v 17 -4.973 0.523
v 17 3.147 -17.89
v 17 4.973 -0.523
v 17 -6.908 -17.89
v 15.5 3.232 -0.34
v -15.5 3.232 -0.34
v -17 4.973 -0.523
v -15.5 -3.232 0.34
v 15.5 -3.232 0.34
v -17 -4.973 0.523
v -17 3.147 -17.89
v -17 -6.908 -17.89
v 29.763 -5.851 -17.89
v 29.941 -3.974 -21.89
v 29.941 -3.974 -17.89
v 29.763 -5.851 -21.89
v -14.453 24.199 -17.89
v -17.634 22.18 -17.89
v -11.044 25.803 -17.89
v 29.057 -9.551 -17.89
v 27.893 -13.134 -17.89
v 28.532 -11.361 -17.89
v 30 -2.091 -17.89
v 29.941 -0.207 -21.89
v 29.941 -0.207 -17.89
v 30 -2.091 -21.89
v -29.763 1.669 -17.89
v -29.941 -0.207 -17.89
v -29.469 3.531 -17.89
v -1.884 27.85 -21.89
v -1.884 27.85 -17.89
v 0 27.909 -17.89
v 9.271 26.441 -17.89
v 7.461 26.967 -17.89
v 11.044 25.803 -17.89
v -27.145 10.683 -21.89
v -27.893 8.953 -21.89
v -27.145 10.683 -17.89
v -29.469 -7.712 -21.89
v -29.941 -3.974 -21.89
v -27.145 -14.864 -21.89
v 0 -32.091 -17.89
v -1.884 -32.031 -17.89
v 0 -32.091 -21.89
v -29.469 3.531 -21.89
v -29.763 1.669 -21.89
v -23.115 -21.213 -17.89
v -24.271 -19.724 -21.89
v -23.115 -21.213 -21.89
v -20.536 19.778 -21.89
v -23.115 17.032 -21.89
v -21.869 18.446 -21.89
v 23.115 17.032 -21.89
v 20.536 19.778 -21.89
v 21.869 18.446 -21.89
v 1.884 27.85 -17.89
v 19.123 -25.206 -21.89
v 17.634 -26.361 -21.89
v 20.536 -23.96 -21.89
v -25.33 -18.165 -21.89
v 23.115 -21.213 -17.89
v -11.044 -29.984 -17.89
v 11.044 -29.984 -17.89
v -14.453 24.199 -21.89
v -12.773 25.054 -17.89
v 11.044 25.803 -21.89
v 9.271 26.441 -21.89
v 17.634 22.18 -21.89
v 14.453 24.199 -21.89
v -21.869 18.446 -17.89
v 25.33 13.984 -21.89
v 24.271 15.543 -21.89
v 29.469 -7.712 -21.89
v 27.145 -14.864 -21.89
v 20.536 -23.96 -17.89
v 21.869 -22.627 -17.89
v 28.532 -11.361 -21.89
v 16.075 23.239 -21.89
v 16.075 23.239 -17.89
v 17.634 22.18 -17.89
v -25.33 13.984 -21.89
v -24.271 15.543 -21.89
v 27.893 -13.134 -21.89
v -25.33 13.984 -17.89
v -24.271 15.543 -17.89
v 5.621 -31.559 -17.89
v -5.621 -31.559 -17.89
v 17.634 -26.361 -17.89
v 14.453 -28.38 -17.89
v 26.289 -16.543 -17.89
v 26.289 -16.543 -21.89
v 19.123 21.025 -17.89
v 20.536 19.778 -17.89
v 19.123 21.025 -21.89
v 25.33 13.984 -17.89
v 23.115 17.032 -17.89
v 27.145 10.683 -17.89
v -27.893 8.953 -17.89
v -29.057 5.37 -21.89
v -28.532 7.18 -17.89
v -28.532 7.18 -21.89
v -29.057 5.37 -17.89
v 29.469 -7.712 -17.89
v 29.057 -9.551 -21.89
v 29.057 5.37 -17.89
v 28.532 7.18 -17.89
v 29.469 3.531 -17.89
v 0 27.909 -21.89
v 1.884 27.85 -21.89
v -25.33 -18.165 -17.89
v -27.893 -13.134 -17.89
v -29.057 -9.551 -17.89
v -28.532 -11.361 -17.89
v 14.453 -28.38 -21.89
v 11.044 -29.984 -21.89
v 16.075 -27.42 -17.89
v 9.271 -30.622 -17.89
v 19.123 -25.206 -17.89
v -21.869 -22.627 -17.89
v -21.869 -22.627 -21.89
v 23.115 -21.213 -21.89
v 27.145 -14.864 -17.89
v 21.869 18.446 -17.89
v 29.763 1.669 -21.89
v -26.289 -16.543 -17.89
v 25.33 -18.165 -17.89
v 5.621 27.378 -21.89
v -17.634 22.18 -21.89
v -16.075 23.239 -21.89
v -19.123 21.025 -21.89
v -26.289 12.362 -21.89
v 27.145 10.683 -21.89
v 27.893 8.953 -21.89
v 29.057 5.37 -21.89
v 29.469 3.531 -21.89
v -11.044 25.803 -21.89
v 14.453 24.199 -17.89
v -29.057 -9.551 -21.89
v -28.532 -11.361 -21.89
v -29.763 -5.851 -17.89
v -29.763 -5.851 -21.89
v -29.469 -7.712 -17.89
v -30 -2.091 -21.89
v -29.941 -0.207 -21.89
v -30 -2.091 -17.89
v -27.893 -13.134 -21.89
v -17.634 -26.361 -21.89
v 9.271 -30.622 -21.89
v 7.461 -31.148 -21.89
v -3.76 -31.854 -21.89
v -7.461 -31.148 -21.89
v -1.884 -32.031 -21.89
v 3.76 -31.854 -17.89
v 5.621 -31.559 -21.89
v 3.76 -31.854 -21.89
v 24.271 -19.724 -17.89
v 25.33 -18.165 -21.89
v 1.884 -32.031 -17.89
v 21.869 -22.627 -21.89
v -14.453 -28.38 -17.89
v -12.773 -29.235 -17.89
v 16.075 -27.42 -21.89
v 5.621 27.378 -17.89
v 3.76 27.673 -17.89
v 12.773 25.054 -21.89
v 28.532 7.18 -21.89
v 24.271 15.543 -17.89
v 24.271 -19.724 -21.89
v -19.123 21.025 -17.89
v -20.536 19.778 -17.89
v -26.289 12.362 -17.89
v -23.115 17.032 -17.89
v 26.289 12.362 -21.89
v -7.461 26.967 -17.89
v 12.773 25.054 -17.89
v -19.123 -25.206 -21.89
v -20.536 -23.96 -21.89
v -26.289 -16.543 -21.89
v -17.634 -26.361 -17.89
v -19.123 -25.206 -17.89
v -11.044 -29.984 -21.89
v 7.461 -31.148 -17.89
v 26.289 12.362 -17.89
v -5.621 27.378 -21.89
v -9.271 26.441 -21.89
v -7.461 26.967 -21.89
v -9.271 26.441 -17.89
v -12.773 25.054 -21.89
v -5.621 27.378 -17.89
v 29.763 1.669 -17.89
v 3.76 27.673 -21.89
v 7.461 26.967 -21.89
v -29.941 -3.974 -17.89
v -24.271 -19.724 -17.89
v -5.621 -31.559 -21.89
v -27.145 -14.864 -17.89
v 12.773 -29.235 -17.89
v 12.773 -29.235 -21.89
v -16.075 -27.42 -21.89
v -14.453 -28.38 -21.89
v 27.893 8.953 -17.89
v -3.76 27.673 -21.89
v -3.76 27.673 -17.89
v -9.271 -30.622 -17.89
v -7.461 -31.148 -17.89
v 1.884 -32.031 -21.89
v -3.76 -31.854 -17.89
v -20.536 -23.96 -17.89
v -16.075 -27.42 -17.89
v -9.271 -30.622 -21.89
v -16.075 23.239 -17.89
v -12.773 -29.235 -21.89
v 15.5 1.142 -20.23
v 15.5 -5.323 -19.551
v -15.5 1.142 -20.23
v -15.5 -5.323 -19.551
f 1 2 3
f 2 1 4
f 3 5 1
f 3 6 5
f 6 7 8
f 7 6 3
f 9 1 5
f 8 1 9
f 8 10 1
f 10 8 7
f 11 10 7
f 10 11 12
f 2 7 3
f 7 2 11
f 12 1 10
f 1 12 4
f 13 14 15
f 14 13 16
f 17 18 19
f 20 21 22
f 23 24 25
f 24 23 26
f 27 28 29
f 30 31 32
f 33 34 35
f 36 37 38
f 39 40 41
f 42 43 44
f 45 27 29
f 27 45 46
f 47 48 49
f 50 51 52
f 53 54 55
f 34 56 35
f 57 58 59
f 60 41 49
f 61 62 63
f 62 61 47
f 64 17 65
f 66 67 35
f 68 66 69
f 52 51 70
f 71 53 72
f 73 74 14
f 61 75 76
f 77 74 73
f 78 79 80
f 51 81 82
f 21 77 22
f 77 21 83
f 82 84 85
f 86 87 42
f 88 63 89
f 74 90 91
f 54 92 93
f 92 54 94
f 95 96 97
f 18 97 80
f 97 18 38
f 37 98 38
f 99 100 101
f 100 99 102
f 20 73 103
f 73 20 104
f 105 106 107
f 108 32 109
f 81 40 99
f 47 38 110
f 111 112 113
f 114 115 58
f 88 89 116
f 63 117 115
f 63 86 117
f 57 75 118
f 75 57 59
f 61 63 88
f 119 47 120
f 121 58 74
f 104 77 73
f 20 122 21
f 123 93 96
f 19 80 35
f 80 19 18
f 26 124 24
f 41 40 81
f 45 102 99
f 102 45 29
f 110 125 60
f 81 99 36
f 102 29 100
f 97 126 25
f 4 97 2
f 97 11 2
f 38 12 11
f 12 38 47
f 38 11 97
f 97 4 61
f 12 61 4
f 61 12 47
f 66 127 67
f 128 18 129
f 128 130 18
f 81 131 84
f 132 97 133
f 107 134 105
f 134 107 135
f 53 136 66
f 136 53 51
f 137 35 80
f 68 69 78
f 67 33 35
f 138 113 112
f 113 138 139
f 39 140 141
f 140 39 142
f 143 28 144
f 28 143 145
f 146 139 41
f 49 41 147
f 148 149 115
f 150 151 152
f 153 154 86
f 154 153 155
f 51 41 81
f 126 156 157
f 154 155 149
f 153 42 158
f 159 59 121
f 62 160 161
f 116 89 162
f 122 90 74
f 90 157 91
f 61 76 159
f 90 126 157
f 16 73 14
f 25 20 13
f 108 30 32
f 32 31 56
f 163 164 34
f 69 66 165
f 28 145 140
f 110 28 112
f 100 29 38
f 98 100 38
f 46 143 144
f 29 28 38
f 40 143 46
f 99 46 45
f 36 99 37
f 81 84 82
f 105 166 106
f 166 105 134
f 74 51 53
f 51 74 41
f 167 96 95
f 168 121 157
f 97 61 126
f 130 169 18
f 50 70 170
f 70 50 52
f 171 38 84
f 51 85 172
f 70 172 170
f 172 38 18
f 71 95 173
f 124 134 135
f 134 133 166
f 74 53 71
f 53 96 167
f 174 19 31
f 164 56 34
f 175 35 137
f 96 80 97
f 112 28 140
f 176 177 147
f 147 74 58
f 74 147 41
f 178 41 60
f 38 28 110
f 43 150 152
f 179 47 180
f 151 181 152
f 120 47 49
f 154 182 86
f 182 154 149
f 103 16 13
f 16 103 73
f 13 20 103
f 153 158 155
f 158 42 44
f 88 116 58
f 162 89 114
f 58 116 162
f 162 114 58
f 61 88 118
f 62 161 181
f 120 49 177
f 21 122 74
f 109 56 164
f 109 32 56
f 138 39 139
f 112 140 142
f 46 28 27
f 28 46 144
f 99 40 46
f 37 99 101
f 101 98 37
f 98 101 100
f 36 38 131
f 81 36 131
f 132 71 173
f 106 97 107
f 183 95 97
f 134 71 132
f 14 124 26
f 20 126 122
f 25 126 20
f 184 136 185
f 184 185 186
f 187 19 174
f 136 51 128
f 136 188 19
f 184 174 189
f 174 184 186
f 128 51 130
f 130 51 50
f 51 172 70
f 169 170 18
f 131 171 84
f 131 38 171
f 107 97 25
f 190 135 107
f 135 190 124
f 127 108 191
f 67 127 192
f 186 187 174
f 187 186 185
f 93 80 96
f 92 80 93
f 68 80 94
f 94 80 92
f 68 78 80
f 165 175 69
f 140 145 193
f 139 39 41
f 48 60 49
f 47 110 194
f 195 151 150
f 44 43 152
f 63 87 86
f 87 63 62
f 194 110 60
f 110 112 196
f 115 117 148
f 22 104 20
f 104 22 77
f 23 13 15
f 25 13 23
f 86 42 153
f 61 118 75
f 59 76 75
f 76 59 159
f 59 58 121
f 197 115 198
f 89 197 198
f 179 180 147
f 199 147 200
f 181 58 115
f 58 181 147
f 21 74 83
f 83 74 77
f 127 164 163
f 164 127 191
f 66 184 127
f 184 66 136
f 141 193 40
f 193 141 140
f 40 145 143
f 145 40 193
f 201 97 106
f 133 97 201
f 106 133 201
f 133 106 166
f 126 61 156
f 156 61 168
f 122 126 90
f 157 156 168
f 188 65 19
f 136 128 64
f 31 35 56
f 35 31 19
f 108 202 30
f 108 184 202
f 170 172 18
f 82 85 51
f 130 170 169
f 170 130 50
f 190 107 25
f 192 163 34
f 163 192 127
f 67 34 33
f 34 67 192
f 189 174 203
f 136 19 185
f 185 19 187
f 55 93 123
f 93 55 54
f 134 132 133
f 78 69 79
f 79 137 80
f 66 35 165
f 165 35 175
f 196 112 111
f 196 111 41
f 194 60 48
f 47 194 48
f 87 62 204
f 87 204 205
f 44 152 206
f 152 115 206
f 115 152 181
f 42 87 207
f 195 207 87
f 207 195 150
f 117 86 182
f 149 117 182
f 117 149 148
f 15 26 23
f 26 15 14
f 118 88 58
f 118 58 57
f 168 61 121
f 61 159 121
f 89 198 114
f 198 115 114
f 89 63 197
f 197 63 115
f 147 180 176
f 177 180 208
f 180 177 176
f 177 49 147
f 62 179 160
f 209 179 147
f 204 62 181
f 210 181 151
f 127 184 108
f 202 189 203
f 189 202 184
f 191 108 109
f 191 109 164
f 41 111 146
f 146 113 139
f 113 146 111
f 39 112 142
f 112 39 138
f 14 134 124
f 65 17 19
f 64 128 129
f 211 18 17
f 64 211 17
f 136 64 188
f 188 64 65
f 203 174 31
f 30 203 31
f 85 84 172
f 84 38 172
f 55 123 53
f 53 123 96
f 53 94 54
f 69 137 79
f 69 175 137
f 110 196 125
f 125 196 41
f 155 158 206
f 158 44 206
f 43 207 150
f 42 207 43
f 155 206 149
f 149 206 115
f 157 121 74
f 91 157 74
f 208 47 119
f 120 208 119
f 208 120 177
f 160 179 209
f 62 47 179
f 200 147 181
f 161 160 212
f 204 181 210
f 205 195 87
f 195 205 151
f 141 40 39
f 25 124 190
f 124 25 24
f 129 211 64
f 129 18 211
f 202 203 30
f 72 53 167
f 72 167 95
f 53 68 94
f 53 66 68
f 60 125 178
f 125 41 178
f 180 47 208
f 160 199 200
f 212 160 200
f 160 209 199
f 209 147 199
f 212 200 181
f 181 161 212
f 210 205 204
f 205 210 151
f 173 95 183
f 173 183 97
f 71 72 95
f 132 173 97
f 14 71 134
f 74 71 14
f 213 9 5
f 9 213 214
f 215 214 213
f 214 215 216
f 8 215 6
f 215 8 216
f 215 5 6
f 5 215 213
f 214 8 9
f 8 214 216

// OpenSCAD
$fn = 100;
rotate([-6, 0, 0]) difference() {
    union() {
translate([0, 0, -10]) cube([ 34, 10, 20 ], true);
translate([0, 0, -20]) rotate([6, 0, 0]) cylinder(4, 30, 30, true);
    }
    cube([ 31, 6.5, 40 ], true);
}
